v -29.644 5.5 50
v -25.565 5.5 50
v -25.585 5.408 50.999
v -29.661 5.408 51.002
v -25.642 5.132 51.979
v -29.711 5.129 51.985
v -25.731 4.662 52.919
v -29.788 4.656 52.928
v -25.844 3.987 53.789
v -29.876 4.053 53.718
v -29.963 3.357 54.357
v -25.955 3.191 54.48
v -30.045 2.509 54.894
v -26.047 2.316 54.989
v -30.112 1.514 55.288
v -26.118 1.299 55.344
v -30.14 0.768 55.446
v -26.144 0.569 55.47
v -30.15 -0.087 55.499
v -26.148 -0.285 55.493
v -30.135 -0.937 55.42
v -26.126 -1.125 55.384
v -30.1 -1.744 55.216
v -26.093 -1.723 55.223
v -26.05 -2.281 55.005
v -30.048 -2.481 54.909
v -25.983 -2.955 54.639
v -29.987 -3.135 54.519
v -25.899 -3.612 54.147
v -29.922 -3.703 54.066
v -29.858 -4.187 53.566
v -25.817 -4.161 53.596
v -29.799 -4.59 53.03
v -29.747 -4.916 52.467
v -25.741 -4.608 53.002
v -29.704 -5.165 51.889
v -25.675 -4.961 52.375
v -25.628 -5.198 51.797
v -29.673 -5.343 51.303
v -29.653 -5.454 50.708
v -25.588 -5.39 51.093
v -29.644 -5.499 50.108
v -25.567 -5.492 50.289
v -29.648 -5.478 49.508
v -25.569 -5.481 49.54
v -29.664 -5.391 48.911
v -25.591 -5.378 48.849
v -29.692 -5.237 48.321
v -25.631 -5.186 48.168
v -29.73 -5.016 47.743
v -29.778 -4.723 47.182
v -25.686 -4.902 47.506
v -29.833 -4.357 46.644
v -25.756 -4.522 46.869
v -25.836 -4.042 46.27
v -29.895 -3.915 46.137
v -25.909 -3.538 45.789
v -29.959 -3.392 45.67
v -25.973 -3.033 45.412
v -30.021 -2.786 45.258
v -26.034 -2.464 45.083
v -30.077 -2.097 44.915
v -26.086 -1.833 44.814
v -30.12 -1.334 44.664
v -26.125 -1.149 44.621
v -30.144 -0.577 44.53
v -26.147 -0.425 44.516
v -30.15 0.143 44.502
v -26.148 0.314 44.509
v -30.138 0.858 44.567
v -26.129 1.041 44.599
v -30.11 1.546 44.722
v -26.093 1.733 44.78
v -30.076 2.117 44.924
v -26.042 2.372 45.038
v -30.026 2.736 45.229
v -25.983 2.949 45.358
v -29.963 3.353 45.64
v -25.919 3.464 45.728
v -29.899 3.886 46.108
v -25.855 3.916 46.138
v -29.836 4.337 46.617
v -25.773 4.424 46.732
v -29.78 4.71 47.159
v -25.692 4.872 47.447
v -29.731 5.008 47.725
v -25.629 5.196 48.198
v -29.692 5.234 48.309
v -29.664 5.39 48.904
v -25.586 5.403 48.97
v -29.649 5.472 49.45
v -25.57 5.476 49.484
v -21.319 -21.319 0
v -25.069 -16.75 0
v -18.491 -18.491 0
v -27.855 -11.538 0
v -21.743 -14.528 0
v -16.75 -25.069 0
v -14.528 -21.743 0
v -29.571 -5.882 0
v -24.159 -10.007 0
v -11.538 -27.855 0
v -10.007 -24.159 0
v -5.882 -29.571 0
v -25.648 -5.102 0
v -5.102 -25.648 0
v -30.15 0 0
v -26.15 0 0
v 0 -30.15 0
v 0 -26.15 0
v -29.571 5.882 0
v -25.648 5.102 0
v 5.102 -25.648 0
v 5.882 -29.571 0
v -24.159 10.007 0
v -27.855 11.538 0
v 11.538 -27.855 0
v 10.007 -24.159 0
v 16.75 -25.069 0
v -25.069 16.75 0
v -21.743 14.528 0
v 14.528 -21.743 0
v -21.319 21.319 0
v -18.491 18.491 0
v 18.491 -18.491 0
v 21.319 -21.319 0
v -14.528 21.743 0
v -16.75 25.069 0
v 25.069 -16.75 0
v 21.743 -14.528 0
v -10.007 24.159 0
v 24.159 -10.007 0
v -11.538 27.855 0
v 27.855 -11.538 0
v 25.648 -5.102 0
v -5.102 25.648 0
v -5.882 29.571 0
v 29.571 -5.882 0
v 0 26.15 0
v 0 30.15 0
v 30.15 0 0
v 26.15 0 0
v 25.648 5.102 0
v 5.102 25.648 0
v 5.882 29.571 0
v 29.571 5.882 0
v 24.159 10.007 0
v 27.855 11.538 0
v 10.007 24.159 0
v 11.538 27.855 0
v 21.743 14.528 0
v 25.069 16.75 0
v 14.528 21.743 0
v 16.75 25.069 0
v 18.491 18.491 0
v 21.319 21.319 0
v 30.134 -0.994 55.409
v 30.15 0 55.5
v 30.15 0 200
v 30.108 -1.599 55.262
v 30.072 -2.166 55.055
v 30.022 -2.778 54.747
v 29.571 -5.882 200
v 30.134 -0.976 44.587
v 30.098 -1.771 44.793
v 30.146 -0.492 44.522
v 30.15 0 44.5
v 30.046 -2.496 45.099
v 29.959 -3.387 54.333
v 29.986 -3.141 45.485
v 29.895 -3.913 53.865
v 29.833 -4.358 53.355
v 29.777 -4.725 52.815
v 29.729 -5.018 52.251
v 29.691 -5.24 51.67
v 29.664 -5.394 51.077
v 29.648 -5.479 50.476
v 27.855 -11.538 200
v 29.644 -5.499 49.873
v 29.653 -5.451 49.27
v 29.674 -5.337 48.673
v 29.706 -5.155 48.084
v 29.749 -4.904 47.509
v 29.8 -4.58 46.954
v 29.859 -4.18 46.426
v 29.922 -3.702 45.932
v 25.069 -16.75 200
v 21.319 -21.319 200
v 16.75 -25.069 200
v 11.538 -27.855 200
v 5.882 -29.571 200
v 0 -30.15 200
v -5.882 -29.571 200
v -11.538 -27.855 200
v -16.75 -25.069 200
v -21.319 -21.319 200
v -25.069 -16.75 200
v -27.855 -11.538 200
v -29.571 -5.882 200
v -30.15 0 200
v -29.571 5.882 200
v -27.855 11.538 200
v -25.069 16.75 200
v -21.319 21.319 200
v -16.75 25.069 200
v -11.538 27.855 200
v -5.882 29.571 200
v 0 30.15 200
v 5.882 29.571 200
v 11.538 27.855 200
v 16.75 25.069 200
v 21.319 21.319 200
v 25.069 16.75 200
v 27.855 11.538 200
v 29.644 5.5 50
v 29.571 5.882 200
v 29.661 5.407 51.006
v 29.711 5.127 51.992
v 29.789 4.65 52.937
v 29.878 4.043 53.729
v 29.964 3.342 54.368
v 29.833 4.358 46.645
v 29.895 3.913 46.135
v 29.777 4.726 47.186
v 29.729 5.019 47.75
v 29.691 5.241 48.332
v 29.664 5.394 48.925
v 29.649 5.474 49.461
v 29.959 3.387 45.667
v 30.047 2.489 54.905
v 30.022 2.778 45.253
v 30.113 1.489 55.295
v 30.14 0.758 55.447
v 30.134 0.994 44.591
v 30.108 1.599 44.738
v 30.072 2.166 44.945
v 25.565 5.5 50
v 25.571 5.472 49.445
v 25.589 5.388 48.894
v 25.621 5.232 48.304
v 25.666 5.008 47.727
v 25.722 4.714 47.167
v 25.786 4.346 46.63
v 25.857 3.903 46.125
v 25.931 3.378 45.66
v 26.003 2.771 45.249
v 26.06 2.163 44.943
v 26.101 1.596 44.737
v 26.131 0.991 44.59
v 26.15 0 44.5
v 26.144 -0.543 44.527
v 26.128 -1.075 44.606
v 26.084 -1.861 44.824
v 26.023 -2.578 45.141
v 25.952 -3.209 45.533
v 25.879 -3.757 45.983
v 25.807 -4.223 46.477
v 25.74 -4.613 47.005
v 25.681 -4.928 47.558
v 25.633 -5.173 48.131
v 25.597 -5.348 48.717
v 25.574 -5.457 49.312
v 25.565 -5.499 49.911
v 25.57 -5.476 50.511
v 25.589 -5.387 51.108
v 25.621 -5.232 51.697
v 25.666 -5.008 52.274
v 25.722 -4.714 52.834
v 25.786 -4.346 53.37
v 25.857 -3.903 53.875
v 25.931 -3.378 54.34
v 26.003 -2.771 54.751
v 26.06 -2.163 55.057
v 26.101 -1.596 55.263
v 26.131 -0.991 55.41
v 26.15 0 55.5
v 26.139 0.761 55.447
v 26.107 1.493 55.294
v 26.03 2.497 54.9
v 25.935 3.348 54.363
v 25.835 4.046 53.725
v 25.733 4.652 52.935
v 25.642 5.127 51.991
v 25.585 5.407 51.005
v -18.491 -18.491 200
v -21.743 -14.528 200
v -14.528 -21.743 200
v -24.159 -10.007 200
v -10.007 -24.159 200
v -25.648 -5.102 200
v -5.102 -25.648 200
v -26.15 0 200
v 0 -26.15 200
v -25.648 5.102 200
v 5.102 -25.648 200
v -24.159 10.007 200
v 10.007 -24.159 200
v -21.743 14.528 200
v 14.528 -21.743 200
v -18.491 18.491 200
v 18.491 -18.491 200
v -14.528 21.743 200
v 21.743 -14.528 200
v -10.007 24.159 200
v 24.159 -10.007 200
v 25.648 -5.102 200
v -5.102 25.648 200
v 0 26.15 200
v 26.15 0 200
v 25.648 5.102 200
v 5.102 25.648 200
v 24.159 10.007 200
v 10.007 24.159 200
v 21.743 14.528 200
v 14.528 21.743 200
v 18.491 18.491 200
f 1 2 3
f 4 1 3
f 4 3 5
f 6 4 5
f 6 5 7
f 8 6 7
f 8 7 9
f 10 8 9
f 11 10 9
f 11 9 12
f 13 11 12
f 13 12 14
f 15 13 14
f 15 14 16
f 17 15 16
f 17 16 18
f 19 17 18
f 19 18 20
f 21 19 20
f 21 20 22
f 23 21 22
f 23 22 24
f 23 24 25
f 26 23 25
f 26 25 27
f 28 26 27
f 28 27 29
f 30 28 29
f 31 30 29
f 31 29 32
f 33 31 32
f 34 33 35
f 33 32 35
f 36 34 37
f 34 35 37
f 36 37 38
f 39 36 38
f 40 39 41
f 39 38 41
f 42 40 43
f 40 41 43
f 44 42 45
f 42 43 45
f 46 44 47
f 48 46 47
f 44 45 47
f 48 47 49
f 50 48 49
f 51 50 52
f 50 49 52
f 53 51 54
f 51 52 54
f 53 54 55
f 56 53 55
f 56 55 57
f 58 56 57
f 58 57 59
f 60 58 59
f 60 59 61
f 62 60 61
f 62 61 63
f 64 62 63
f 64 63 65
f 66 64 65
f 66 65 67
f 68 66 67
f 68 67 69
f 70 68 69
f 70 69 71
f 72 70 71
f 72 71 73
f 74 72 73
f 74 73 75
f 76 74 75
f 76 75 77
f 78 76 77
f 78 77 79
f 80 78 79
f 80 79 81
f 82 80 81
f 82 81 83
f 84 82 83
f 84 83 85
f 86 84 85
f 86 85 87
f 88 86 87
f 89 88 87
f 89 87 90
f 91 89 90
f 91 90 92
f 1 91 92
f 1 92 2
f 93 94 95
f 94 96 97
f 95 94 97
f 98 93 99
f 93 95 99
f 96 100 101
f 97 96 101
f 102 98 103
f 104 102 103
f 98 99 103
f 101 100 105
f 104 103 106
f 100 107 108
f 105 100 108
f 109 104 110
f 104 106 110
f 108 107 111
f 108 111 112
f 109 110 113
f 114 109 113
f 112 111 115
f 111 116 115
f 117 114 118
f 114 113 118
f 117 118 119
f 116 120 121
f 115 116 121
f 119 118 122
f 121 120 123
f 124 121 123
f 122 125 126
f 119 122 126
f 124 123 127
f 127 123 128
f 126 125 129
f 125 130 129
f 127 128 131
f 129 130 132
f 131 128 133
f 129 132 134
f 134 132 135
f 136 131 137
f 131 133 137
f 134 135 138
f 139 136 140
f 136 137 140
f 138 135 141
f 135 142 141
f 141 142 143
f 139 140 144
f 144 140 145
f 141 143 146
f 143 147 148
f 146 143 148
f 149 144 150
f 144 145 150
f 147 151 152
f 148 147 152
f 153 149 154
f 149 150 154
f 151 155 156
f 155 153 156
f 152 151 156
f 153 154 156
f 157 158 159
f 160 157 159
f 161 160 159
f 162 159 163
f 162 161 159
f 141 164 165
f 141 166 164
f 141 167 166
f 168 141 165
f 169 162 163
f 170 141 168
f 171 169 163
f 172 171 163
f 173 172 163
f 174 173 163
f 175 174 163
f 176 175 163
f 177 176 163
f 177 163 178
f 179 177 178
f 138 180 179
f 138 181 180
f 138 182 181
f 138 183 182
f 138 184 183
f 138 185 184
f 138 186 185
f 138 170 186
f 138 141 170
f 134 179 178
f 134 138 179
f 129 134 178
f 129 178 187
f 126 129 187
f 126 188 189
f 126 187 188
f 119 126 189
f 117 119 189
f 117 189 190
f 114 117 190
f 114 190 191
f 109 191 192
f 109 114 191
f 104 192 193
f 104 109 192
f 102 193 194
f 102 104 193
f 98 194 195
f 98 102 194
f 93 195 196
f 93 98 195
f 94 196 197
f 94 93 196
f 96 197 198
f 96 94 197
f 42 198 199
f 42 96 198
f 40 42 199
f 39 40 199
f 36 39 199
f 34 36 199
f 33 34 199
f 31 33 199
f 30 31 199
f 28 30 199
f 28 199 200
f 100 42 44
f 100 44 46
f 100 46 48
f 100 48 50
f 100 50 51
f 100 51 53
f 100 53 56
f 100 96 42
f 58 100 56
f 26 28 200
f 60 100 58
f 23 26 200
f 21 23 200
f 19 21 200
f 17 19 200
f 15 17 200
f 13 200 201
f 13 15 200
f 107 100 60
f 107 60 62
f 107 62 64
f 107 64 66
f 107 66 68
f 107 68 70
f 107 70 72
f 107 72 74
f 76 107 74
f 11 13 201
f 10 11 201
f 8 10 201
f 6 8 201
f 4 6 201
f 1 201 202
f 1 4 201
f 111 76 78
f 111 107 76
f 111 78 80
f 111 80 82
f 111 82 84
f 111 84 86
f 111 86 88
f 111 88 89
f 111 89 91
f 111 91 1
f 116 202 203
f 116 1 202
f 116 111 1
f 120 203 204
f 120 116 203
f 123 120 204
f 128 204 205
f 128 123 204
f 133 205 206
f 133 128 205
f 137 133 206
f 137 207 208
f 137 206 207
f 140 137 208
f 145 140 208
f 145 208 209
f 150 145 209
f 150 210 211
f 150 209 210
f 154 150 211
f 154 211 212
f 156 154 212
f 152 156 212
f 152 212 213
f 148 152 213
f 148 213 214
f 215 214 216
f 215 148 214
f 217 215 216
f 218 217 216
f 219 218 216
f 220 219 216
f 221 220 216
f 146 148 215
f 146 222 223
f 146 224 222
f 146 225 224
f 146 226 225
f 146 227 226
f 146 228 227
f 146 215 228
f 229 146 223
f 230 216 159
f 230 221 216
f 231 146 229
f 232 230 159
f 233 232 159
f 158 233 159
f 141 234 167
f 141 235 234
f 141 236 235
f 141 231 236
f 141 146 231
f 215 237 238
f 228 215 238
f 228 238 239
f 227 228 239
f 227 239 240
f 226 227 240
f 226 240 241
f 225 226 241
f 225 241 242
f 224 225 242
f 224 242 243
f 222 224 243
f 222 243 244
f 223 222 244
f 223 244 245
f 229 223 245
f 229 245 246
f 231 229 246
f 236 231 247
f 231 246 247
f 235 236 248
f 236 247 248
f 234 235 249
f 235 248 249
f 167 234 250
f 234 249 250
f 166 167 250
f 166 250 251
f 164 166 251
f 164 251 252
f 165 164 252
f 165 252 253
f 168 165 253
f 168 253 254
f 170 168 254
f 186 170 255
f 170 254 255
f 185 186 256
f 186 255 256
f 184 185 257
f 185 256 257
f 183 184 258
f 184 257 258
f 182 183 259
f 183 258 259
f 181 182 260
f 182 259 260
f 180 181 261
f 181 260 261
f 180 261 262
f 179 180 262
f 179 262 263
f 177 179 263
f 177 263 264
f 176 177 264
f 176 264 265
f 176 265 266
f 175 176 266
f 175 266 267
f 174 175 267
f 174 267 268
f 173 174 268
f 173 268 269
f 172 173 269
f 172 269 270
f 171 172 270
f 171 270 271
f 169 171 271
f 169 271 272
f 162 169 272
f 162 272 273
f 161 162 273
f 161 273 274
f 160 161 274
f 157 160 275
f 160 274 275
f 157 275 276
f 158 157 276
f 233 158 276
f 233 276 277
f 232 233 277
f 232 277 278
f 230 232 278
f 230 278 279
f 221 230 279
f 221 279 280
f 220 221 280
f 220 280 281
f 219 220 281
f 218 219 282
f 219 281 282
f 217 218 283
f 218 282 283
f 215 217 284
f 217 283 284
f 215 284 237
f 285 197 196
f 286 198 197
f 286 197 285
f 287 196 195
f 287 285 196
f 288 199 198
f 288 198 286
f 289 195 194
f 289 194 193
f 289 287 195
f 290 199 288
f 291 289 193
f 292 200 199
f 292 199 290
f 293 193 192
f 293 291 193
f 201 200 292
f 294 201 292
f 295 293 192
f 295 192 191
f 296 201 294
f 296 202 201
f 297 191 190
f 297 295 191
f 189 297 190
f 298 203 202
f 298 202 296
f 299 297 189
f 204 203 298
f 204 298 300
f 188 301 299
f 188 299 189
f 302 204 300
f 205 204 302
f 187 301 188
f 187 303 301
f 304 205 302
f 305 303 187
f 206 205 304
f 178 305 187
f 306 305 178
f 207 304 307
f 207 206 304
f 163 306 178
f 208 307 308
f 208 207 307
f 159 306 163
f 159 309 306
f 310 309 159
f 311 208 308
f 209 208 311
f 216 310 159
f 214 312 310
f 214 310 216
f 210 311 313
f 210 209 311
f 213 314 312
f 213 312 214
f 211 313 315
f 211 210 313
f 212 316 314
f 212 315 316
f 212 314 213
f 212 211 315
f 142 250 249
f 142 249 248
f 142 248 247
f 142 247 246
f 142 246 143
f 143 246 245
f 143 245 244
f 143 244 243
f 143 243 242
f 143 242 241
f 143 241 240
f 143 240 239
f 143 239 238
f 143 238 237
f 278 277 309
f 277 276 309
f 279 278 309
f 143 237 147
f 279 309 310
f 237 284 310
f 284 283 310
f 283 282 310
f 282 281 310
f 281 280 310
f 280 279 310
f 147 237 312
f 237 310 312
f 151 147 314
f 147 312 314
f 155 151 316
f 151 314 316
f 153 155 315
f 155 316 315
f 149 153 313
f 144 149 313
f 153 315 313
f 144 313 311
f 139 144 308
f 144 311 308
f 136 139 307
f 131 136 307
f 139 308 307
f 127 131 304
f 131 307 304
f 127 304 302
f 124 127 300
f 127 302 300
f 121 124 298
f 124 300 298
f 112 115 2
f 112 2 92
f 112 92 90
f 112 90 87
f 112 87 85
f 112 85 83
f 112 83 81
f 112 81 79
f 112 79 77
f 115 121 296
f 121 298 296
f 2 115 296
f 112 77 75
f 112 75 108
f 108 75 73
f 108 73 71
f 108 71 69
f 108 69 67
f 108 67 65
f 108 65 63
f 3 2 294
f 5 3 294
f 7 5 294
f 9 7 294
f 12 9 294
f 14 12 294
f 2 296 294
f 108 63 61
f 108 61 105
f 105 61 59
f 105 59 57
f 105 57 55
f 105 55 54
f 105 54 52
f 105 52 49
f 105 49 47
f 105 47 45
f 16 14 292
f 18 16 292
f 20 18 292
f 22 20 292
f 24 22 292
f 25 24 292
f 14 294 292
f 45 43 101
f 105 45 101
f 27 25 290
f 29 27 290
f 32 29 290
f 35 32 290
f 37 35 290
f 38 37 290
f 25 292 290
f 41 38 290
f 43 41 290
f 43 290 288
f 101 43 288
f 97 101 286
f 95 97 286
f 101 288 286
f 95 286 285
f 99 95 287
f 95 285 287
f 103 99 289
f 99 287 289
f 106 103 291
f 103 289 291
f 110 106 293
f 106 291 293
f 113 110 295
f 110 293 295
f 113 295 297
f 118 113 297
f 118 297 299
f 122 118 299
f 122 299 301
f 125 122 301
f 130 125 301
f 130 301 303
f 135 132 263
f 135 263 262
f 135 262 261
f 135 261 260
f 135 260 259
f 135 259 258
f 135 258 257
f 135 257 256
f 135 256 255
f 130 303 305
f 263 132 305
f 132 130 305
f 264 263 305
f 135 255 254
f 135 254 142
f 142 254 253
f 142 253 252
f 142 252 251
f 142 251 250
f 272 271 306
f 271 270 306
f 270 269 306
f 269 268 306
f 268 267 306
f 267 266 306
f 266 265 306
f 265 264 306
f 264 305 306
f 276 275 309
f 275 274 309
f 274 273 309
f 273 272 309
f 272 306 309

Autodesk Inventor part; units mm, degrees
ref_plane "YZ Plane" through (0, 0, 0) normal (1, 0, 0) x (0, 1, 0)
ref_plane "XZ Plane" through (0, 0, 0) normal (0, 1, 0) x (-1, 0, 0)
ref_plane "XY Plane" through (0, 0, 0) normal (0, 0, 1) x (1, 0, 0)
sketch "Sketch1" plane through (0, 0, 0) normal (0, 0, 1) x (1, 0, 0)
  circle A0 centre (0, 0) radius 30.15
  dimension "d0" = 60.3
extrude "Extrusion1" add sketch "Sketch1" along normal blind 200
sketch "Sketch2" plane through (0, 0, 200) normal (0, 0, 1) x (1, 0, 0)
  circle A0 centre (0, 0) radius 26.15
  dimension "d3" = 52.3
extrude "Extrusion2" cut sketch "Sketch2" against normal blind 200
sketch "Sketch3" plane through (0, 0, 0) normal (1, 0, 0) x (0, 1, 0)
  circle A0 centre (0, 50) radius 5.5
  line L0 (30.15, 0) -> (-30.15, 0) projected
  point P0 (0, 0)
  dimension "d6" = 11
  dimension "d7" = 50
extrude "Extrusion3" cut sketch "Sketch3" along normal through all both and the other way through all
properties part number "rura do spawania"
